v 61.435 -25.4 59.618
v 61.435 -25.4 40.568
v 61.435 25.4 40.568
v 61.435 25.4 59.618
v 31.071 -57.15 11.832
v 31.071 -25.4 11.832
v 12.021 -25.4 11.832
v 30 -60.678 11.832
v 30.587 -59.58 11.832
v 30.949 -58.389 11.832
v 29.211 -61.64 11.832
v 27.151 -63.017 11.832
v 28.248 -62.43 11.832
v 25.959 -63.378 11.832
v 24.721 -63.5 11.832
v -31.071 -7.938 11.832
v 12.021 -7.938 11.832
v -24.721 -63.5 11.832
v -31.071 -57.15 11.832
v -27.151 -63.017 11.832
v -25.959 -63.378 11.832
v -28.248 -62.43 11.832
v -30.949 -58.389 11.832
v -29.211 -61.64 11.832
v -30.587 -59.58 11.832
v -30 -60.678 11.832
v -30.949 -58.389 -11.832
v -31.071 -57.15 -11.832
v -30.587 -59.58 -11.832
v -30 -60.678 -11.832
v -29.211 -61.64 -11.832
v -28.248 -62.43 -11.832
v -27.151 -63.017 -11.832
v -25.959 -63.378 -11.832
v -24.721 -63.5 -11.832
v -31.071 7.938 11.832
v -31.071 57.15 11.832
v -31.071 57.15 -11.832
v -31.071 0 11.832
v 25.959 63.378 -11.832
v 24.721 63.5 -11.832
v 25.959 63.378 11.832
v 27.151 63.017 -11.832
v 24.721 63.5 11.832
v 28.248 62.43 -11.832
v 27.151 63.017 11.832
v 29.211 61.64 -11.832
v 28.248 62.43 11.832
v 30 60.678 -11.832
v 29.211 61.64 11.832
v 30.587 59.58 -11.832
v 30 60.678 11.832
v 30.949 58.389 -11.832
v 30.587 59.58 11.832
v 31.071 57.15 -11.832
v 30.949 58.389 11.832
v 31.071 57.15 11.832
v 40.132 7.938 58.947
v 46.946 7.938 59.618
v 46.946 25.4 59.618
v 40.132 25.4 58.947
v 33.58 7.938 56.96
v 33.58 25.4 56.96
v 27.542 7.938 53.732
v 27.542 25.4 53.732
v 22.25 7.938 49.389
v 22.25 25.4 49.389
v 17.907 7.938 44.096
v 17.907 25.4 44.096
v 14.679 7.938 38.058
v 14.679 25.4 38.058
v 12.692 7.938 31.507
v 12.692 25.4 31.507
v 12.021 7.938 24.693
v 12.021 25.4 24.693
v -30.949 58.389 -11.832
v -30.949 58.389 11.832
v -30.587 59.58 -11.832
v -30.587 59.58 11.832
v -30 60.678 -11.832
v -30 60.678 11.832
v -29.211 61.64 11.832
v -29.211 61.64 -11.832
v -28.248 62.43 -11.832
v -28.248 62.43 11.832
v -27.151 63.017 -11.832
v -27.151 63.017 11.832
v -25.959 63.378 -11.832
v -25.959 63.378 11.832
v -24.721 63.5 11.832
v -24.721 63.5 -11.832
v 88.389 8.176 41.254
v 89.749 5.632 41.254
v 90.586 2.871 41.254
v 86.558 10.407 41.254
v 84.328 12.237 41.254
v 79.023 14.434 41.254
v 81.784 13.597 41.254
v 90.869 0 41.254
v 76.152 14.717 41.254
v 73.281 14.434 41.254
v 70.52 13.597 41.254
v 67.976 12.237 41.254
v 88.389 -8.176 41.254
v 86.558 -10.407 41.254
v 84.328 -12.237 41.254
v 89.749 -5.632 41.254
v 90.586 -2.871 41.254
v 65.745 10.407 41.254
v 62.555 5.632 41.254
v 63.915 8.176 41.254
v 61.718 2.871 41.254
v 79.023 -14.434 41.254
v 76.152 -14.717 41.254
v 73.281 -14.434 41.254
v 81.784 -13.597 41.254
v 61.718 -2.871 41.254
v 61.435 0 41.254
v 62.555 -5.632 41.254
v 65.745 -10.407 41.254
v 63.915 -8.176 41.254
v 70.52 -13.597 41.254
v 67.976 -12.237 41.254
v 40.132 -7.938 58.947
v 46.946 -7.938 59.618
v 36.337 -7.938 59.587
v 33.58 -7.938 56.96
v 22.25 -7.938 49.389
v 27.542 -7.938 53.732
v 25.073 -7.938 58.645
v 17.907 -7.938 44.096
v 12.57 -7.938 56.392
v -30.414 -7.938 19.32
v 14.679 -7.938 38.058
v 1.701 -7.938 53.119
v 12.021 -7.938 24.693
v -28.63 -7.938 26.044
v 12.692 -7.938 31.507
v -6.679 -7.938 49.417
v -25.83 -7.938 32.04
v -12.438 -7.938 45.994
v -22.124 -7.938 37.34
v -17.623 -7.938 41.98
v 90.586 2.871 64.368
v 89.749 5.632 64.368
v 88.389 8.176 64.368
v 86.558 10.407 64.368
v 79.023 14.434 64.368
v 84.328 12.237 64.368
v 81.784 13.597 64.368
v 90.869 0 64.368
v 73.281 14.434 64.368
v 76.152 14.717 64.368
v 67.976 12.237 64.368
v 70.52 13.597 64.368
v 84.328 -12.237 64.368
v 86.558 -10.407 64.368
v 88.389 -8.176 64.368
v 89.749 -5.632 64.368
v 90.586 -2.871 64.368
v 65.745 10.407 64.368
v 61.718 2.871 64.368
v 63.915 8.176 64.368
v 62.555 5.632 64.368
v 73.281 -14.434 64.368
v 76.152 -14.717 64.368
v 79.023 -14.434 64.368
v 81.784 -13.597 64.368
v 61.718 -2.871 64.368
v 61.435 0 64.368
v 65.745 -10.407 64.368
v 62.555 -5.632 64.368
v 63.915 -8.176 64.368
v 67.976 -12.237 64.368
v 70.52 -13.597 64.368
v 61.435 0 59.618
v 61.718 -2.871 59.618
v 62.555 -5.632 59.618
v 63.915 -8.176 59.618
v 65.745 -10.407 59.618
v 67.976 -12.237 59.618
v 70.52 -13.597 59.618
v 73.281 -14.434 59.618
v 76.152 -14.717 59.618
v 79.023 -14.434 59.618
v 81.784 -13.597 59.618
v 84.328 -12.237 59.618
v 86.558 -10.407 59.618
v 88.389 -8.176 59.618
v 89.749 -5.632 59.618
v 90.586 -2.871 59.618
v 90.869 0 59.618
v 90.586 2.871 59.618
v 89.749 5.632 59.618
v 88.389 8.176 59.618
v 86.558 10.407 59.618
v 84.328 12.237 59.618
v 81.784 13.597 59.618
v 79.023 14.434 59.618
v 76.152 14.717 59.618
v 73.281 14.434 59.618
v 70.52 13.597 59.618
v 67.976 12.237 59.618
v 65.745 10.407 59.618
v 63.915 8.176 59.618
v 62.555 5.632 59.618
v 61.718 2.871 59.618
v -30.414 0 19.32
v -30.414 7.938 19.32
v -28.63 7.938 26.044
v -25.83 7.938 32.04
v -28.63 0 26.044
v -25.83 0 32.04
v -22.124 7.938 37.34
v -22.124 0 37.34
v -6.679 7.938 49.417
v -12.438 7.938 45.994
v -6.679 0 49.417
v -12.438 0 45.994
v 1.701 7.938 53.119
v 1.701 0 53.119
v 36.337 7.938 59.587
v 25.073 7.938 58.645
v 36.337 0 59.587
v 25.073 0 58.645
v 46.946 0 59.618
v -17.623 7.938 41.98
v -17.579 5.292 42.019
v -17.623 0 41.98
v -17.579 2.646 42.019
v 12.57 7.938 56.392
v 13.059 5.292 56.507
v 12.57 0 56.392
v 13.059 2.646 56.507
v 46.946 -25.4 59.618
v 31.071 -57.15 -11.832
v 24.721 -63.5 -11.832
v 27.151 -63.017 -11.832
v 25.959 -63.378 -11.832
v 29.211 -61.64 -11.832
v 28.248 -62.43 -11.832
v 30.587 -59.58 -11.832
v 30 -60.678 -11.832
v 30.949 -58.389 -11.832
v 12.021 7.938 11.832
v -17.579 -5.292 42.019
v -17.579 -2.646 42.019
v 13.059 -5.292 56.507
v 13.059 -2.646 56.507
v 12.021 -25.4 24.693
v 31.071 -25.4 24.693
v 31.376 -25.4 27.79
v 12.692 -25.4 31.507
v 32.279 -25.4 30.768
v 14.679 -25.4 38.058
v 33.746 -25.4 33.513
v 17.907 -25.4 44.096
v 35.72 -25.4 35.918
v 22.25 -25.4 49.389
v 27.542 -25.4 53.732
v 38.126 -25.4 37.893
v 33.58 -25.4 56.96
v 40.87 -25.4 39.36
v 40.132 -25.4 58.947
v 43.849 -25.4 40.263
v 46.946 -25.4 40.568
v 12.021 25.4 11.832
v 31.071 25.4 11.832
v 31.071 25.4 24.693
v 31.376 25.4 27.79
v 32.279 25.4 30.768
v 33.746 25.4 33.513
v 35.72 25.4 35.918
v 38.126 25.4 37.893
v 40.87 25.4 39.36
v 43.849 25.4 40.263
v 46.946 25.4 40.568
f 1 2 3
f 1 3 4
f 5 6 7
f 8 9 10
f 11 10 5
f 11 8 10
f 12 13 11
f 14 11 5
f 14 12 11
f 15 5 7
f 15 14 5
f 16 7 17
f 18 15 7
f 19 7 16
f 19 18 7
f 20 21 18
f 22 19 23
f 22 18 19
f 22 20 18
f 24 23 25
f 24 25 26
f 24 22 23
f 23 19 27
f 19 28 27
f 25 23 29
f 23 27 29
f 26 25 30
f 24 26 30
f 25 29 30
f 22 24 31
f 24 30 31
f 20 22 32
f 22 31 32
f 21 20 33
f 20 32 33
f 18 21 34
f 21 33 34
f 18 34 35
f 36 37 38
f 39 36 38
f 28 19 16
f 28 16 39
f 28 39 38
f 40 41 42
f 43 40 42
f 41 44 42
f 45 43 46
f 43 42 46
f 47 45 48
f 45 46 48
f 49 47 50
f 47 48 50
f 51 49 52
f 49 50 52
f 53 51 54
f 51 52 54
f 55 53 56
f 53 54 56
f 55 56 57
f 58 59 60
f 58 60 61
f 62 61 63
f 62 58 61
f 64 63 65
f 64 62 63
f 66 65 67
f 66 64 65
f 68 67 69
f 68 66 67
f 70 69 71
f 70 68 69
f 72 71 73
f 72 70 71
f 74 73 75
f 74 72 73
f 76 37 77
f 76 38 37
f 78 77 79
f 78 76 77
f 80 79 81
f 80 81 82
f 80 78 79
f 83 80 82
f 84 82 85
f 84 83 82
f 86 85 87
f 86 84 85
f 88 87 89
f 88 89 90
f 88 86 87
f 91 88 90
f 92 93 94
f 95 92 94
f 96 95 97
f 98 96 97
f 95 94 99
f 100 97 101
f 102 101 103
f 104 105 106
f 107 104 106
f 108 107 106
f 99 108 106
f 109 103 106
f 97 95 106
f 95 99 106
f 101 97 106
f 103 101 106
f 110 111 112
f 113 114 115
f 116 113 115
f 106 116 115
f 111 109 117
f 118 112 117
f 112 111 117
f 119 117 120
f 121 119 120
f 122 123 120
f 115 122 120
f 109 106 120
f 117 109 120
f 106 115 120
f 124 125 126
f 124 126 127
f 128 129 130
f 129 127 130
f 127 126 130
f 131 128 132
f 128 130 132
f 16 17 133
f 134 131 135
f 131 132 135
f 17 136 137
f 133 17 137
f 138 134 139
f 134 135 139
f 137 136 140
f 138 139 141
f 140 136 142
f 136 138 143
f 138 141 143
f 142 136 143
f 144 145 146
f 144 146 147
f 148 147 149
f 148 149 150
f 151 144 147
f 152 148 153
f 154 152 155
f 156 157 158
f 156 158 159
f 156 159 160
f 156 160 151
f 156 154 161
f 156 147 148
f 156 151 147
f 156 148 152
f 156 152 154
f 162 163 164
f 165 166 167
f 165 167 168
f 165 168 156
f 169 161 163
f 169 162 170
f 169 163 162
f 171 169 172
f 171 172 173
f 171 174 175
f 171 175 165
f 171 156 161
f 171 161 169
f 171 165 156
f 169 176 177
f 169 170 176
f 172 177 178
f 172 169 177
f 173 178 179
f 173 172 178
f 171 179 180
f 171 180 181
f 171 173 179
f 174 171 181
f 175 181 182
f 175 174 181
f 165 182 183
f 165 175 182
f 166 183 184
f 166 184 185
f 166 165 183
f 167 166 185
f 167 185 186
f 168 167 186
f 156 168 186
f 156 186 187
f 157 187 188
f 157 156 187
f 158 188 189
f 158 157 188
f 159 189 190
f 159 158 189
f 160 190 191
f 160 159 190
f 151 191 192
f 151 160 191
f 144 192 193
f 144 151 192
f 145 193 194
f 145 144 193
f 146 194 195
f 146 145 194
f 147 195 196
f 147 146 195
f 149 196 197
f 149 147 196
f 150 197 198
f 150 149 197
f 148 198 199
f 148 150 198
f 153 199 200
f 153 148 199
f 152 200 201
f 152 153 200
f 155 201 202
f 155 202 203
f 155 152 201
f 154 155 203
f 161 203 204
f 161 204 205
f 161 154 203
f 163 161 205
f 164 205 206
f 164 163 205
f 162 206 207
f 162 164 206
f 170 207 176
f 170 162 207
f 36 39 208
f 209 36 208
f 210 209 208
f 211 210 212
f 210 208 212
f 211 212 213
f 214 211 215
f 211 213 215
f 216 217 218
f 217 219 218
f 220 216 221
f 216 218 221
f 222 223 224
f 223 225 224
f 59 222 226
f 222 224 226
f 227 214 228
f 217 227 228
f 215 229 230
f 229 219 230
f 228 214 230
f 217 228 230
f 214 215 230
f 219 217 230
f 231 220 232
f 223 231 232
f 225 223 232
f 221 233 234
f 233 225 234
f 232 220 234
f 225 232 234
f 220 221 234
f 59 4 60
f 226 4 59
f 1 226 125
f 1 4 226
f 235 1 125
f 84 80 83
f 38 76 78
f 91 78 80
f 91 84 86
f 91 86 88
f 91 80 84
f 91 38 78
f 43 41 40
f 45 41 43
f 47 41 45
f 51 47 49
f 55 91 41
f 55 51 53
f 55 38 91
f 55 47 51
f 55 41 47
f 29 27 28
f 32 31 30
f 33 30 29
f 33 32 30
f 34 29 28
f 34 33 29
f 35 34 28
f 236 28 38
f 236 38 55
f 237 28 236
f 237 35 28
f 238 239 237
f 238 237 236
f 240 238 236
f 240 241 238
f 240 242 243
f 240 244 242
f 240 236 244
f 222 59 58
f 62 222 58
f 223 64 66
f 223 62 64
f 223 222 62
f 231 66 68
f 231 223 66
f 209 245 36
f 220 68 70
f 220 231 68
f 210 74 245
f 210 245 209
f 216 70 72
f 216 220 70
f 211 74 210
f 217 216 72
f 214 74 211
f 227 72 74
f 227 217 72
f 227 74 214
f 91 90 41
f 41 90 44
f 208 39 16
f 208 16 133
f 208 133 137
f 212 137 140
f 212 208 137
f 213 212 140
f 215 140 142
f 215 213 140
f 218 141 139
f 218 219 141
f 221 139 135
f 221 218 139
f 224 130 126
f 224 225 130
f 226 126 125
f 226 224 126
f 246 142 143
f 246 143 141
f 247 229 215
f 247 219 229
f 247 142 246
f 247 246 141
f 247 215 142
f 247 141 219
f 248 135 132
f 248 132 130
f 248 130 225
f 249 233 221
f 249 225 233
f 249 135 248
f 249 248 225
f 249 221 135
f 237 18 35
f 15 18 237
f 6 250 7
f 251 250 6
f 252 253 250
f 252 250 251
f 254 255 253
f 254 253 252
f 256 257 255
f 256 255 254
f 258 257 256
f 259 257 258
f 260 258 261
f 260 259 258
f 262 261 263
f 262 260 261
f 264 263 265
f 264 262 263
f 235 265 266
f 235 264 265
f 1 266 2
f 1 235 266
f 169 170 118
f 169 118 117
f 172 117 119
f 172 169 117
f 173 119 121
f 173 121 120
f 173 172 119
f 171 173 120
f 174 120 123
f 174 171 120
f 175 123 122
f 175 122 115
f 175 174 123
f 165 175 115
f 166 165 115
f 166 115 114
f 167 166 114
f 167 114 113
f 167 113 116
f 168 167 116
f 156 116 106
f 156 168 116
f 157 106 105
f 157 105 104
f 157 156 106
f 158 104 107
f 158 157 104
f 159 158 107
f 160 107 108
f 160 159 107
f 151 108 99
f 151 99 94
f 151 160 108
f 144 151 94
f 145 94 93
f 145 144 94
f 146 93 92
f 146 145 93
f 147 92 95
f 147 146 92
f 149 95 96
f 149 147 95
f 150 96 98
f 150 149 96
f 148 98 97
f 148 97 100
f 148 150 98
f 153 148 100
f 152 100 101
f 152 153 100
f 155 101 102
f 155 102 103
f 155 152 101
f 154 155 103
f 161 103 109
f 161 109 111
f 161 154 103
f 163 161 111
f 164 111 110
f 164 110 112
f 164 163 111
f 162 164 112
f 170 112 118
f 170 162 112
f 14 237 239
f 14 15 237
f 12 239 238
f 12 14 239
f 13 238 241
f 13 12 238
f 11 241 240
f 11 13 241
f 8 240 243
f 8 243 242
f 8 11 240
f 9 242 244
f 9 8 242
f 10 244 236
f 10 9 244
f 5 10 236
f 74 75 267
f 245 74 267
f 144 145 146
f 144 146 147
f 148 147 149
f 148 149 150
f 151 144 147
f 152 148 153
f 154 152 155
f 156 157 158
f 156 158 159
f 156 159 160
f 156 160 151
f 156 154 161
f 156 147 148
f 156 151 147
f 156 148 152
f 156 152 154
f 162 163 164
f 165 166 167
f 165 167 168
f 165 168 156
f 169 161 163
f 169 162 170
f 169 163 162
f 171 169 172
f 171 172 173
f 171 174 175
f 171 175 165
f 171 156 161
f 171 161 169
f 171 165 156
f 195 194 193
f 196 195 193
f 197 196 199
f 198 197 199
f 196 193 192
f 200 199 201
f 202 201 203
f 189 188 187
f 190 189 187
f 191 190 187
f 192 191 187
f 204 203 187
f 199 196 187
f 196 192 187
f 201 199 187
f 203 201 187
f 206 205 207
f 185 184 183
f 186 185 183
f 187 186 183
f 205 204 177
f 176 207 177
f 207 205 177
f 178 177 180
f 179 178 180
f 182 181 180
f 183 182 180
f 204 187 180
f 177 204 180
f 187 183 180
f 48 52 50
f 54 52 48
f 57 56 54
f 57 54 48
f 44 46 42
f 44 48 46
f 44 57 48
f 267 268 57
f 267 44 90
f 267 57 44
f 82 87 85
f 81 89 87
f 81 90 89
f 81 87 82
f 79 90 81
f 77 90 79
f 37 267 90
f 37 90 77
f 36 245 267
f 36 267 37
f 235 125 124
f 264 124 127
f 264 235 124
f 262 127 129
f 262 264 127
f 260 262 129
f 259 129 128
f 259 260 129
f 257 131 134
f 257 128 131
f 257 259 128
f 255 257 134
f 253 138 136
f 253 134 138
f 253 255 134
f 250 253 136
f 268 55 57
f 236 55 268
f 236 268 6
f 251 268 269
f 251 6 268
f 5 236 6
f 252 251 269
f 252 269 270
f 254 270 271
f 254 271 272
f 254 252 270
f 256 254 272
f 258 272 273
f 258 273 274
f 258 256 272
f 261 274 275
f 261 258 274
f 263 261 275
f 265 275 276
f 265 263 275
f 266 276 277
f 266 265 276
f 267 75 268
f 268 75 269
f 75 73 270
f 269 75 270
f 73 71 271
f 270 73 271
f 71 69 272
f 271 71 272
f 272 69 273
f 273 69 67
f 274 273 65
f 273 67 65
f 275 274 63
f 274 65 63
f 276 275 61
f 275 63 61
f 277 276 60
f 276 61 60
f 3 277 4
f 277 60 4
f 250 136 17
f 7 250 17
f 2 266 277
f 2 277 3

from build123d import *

# Parameters (mm, degrees)
F1_DEPTH = 63.5
F2_DEPTH = 25.4
F3_DEPTH = 7.9375
F0_W     = 14.7170773314
F0_H     = 4.7498
F5_DEPTH = 23.114
F6_R     = 6.35


with BuildPart() as f1:
    # F0 (on Front) → F1 (new body, symmetric)
    with BuildSketch(Plane.XZ):
        Polygon((12.0205828078, 11.8320416201), (-31.0705828078, 11.8320416201), (-31.0705828078, -11.8320416201), (31.0705828078, -11.8320416201), (31.0705828078, 11.8320416201), align=None)
    extrude(amount=F1_DEPTH, both=True)

    # F0 (on Front) → F2 (join, symmetric)
    with BuildSketch(Plane.XZ):
        with BuildLine():
            Line((12.0205828078, 24.6931583799), (12.0205828078, 11.8320416201))
            Line((12.0205828078, 11.8320416201), (31.0705828078, 11.8320416201))
            Line((31.0705828078, 11.8320416201), (31.0705828078, 24.6931583799))
            ThreePointArc((31.0705828078, 24.6931583799), (35.7202626564, 35.9184785312), (46.9455828078, 40.5681583799))
            Line((46.9455828078, 40.5681583799), (61.4348004065, 40.5681583799))
            Line((61.4348004065, 40.5681583799), (61.4348004065, 59.6181583799))
            Line((61.4348004065, 59.6181583799), (46.9455828078, 59.6181583799))
            ThreePointArc((46.9455828078, 59.6181583799), (22.2498784748, 49.3888627128), (12.0205828078, 24.6931583799))
        make_face()
    extrude(amount=F2_DEPTH, both=True)

    # F0 (on Front) → F3 (join, symmetric)
    with BuildSketch(Plane.XZ):
        with BuildLine():
            add(Edge.make_bspline(
                [(-31.0705828078, 11.8320416201), (-30.7864588107, 51.3086781095), (16.0687774749, 60.755262794), (46.9455828078, 59.6181583799)],
                knots=[0, 0, 0, 0, 91.4878956602, 91.4878956602, 91.4878956602, 91.4878956602], degree=3))
            Line((-31.0705828078, 11.8320416201), (12.0205828078, 11.8320416201))
            Line((12.0205828078, 11.8320416201), (12.0205828078, 24.6931583799))
            ThreePointArc((12.0205828078, 24.6931583799), (22.2498784748, 49.3888627128), (46.9455828078, 59.6181583799))
        make_face()
    extrude(amount=F3_DEPTH, both=True)

    # F6
    f6_edges = [f1.edges().sort_by_distance(p)[0] for p in [
        (31.070583, -63.5, 0),
        (31.070583, 63.5, 0),
        (-31.070583, 63.5, 0),
        (-31.070583, -63.5, 0),
    ]]
    fillet(f6_edges, radius=F6_R)


with BuildPart() as f4:
    # F0 (on Front) → F4 (revolve)
    with BuildSketch(Plane.XZ):
        with Locations((68.7933390722, 61.9930583799)):
            Rectangle(F0_W, F0_H)
    revolve(axis=Axis((76.1518777379, 0, 52.4680583799), (0, 0, 1)))


with BuildPart() as f5:
    # F5 (new): a face of the model
    f5_faces = [f4.part.faces().sort_by_distance(p)[0] for p in [
        (76.1518777379, 0, 64.3679583799),
    ]]
    extrude(f5_faces, amount=-F5_DEPTH)


solid = Compound([f1.part, f4.part, f5.part])
